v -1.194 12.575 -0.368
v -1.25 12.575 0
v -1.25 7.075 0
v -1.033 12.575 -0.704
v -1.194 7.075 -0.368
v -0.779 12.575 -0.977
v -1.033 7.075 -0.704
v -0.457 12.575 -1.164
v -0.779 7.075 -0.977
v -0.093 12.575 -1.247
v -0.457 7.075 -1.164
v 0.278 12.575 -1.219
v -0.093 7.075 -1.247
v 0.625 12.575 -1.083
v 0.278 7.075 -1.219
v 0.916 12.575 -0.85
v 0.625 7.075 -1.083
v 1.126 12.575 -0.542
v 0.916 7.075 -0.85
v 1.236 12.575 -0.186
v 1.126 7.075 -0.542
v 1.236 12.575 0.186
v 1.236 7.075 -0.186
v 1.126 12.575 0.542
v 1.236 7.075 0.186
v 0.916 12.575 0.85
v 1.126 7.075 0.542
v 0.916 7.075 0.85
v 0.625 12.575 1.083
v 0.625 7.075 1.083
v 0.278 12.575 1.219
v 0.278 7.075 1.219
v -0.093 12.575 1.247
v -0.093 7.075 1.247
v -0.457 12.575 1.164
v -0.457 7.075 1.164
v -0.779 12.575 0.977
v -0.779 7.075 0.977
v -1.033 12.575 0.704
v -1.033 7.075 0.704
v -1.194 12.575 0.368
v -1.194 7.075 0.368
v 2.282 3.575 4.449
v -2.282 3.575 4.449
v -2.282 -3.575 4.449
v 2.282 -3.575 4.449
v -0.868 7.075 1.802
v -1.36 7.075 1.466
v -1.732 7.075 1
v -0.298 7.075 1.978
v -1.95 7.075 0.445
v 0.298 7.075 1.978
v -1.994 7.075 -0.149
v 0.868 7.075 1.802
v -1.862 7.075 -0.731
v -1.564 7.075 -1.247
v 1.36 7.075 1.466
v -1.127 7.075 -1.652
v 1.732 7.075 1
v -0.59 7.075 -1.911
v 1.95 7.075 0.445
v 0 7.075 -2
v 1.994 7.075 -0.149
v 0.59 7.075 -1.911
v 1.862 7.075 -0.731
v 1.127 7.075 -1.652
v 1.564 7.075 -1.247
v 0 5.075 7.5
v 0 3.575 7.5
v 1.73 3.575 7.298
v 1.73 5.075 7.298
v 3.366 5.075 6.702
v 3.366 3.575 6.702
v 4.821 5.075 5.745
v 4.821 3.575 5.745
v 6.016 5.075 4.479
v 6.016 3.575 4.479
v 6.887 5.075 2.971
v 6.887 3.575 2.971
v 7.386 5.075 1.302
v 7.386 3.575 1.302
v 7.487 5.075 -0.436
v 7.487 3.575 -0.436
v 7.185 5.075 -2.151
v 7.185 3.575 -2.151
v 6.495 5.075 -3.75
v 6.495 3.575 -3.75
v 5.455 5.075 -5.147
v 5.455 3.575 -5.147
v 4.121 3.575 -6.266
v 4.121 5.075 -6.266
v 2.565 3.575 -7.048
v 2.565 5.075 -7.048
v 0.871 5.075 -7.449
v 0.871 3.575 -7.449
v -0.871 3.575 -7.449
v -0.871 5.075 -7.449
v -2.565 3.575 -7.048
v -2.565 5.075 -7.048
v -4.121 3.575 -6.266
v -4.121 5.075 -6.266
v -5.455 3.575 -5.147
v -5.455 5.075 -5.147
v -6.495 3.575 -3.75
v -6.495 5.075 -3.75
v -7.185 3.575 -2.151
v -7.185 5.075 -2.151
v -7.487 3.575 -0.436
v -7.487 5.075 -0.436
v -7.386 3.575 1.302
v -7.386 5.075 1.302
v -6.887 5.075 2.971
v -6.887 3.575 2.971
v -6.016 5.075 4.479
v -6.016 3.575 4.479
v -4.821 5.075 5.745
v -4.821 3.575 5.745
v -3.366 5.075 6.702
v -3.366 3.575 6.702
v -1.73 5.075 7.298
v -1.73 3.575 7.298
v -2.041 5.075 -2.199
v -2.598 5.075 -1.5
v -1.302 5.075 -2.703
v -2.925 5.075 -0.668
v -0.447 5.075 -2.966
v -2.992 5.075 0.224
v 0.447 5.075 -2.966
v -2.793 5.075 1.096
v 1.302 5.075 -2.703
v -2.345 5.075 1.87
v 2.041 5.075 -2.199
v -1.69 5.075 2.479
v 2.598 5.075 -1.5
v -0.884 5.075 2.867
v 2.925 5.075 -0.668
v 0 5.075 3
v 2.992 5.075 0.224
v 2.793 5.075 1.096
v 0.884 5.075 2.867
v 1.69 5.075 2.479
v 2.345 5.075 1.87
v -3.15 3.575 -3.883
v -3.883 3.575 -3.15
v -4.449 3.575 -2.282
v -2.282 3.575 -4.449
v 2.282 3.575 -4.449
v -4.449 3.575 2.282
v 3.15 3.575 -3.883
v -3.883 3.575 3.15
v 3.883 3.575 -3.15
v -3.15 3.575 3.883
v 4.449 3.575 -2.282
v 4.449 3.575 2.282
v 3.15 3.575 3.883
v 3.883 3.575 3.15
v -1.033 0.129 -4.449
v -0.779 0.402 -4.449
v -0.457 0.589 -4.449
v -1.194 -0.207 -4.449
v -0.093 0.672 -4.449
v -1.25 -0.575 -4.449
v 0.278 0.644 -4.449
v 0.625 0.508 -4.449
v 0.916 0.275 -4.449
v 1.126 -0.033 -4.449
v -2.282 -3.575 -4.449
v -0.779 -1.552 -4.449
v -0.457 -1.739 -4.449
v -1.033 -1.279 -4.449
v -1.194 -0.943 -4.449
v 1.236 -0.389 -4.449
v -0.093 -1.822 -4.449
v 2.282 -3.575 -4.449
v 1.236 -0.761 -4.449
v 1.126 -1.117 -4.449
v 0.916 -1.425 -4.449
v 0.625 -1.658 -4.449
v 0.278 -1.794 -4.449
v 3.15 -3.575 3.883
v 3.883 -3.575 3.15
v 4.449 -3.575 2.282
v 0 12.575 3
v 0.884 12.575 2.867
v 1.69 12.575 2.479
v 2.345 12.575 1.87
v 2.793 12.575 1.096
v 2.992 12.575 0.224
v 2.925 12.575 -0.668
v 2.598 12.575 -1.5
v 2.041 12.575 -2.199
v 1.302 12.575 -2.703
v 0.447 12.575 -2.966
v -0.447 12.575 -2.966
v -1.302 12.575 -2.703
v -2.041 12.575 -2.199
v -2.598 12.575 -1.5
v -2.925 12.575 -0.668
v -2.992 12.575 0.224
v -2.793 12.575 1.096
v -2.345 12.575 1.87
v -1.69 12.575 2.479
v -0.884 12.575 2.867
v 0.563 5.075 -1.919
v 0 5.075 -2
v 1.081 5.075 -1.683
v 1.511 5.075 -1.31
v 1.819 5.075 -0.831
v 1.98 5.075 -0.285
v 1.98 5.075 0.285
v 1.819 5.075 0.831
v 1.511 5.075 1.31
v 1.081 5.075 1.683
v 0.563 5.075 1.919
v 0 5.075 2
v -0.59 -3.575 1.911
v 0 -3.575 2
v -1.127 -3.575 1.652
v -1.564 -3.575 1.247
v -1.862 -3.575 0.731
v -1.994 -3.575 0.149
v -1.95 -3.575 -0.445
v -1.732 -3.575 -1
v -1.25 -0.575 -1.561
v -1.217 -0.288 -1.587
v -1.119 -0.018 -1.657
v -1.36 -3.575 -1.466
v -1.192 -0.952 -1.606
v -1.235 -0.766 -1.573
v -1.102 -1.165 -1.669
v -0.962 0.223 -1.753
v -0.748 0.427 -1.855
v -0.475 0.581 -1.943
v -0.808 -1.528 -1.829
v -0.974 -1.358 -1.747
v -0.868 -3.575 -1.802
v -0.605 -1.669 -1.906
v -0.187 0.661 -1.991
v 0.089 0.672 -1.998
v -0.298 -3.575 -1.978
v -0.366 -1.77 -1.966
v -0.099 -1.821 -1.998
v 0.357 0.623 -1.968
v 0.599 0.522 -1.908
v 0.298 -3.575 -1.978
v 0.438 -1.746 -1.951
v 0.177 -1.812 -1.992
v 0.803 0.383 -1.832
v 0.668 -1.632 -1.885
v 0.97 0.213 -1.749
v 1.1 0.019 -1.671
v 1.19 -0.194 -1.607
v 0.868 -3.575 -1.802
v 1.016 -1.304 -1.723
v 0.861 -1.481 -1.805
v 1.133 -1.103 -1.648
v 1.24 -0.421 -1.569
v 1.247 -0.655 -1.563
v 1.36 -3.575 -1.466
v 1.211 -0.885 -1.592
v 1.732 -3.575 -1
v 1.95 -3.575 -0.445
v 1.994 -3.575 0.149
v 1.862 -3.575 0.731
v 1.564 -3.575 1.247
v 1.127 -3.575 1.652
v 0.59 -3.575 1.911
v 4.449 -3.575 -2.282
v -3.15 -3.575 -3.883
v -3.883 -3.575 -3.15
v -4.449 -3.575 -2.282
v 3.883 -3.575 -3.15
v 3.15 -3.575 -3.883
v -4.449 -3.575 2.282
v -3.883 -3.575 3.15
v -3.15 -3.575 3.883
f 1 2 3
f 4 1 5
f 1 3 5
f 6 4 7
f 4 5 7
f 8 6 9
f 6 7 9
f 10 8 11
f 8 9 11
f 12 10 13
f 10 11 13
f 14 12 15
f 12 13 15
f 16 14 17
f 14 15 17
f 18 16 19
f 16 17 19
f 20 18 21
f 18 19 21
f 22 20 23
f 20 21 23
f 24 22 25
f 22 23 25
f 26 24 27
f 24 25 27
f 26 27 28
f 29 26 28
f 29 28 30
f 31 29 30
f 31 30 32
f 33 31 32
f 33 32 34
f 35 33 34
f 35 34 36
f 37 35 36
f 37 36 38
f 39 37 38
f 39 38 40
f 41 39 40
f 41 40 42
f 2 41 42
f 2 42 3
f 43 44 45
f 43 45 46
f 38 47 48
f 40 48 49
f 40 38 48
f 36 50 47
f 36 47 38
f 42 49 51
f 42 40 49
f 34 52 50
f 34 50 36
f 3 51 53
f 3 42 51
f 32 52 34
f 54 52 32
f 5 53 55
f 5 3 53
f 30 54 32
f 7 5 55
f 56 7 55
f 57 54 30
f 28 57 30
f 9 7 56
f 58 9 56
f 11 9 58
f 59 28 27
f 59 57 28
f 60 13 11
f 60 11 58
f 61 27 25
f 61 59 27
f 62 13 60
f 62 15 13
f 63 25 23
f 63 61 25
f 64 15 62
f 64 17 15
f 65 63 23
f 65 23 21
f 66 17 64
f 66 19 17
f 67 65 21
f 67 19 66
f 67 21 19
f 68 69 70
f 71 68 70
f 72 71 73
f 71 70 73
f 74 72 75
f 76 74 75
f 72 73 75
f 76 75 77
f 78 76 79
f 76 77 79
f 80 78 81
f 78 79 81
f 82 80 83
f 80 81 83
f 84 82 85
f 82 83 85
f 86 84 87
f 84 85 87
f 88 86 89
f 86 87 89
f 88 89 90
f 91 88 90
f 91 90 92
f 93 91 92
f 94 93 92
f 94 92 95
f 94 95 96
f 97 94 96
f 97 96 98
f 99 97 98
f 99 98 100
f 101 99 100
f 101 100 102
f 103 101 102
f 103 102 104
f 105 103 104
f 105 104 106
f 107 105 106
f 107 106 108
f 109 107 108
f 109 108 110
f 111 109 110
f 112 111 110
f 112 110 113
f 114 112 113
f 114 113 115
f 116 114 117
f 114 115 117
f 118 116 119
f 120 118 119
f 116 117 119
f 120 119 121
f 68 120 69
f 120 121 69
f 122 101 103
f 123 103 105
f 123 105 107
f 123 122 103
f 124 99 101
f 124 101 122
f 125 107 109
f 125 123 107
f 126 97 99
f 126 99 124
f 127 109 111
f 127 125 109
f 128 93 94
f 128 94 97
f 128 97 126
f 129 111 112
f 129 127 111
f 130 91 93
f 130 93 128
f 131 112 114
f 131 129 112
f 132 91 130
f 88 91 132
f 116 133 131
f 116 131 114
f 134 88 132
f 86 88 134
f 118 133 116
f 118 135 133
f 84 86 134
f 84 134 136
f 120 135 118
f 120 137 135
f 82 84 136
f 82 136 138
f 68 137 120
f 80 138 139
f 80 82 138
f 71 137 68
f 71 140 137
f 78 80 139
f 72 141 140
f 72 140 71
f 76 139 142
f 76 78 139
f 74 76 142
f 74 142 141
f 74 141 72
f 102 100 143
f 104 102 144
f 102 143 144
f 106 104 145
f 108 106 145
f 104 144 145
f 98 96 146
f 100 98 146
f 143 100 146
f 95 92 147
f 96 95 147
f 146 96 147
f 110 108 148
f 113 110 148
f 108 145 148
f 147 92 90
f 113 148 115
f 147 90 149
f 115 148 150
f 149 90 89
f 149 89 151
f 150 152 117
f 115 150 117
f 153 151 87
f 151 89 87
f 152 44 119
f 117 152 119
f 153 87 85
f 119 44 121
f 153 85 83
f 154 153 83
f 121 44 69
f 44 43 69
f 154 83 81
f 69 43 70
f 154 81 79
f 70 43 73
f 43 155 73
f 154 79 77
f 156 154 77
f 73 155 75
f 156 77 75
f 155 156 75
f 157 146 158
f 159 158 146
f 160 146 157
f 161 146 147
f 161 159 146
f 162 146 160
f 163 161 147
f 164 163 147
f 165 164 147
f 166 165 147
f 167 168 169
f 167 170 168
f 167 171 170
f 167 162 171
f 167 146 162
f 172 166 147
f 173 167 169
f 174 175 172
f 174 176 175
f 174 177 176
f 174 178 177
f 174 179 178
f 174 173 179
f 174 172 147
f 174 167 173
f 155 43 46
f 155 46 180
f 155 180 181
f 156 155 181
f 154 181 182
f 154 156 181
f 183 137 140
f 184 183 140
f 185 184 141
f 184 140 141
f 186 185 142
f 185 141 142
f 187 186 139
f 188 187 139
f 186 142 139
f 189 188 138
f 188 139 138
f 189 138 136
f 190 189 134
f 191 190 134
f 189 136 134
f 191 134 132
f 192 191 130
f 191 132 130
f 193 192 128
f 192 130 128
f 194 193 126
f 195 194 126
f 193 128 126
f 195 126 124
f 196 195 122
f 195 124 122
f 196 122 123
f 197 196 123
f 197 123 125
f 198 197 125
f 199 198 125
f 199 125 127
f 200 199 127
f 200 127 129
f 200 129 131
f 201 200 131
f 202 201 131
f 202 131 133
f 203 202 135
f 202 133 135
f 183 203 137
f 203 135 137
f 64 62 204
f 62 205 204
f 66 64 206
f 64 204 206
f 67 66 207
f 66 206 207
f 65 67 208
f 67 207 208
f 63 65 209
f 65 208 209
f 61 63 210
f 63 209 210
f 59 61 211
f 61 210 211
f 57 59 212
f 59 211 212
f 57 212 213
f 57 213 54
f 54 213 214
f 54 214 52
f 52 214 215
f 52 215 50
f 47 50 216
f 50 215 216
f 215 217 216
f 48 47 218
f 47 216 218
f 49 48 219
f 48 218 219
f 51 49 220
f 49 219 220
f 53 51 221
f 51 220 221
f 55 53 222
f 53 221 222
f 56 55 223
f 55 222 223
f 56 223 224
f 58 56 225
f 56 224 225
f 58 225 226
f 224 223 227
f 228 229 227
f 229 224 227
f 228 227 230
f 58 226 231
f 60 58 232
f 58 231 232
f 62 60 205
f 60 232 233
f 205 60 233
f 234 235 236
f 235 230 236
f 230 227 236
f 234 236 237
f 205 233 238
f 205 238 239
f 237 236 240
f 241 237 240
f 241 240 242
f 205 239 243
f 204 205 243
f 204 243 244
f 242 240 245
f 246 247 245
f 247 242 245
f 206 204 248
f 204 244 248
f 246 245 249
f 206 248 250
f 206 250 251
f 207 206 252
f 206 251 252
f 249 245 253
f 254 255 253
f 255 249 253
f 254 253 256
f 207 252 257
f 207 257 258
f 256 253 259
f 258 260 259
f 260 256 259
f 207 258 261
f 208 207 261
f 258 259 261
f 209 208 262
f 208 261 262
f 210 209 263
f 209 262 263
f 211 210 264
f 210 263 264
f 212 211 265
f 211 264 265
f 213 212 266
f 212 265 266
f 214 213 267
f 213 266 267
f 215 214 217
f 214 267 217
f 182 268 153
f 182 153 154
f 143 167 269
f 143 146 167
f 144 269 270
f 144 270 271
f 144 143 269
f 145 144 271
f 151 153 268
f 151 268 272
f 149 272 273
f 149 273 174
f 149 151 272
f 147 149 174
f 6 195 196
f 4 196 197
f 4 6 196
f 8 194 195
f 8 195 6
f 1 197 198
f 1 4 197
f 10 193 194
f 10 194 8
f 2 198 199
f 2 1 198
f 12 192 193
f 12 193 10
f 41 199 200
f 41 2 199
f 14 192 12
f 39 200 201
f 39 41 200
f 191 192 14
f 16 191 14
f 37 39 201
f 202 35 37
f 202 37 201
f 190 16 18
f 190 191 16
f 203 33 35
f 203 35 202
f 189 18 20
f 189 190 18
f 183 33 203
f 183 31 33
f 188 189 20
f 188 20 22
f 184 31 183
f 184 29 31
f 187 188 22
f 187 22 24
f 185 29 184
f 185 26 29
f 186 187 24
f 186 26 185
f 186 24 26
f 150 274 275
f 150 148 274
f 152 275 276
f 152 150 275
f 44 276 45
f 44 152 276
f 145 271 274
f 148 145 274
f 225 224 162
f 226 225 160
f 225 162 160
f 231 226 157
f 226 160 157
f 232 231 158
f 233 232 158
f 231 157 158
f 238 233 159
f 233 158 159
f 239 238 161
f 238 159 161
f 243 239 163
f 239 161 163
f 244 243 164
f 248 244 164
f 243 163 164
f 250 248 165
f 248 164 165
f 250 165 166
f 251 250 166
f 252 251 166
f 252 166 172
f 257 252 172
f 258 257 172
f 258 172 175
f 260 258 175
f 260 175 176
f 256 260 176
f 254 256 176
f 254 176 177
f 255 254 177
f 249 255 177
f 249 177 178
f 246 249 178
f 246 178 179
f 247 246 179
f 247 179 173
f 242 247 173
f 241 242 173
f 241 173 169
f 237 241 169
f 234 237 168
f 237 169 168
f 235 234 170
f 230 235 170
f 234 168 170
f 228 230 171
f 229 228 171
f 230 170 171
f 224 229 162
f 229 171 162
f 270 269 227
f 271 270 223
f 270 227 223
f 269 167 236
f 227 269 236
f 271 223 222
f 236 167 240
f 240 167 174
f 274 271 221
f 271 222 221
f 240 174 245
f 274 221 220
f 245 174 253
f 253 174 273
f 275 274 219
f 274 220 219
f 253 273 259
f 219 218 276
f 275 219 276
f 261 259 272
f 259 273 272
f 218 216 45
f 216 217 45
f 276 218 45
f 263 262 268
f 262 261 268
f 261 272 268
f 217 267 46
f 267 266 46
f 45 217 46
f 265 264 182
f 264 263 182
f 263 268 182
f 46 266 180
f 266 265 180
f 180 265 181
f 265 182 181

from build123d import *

# Parameters (mm, degrees)
SKETCH1_R                  = 5
SKETCH1_R_2                = 2
BOSS_EXTRUDE1_DEPTH        = 3.575
SKETCH2_R                  = 7.5
SKETCH2_R_2                = 2
BOSS_EXTRUDE2_DEPTH        = 1.5
SKETCH3_W                  = 11.269871592
SKETCH3_H                  = 12.441128044
SKETCH3_W_2                = 8.898049958
SKETCH3_H_2                = 8.898049958
CUT_EXTRUDE1_DEPTH         = 7.15
M3X0_5_TAPPED_HOLE1_REACH  = 16.993
M3X0_5_TAPPED_HOLE1_BORE_R = 1.25
SKETCH9_R                  = 3
SKETCH9_R_2                = 2
BOSS_EXTRUDE3_DEPTH        = 7.5
SKETCH11_R                 = 2
BOSS_EXTRUDE4_DEPTH        = 7.5
M3X0_5_TAPPED_HOLE2_D      = 2.5
SKETCH15_R                 = 2
SKETCH15_R_2               = 1.25
CUT_EXTRUDE2_DEPTH         = 2


with BuildPart() as part:
    # Sketch1 → Boss-Extrude1 (new, symmetric)
    with BuildSketch(Plane(origin=(0, 0, 0), x_dir=(1, 0, 0), z_dir=(0, 1, 0))):
        with Locations(Location((0, 0, 0), (0, 0, 270))):
            Circle(SKETCH1_R)
        with Locations(Location((0, 0, 0), (0, 0, 270))):
            Circle(SKETCH1_R_2, mode=Mode.SUBTRACT)
    extrude(amount=BOSS_EXTRUDE1_DEPTH, both=True)

    # Sketch2 → Boss-Extrude2 (add)
    with BuildSketch(Plane(origin=(0, 3.575, 0), x_dir=(1, 0, 0), z_dir=(0, 1, 0))):
        with Locations(Location((0, 0, 0), (0, 0, 270))):
            Circle(SKETCH2_R)
        with Locations(Location((0, 0, 0), (0, 0, 270))):
            Circle(SKETCH2_R_2, mode=Mode.SUBTRACT)
    extrude(amount=BOSS_EXTRUDE2_DEPTH)

    # Sketch3 → Cut-Extrude1 (cut)
    with BuildSketch(Plane.XZ.offset(3.575)):
        Rectangle(SKETCH3_W, SKETCH3_H)
        Rectangle(SKETCH3_W_2, SKETCH3_H_2, mode=Mode.SUBTRACT)
    extrude(amount=-CUT_EXTRUDE1_DEPTH, mode=Mode.SUBTRACT)

    # M3x0.5 Tapped Hole1 bore → M3x0.5 Tapped Hole1 (cut, up to next)
    with BuildSketch(Plane(origin=(0, 0, -4.449024979), x_dir=(-1, 0, 0), z_dir=(0, 0, -1)), mode=Mode.PRIVATE) as m3x0_5_tapped_hole1_sk1:
        with Locations((0, -0.575)):
            Circle(M3X0_5_TAPPED_HOLE1_BORE_R)
    m3x0_5_tapped_hole1_tool1 = extrude(m3x0_5_tapped_hole1_sk1.sketch, amount=-M3X0_5_TAPPED_HOLE1_REACH, mode=Mode.PRIVATE) & part.part
    add(m3x0_5_tapped_hole1_tool1.solids().sort_by_distance((0, -0.575, -4.449025))[0], mode=Mode.SUBTRACT)

    # Sketch9 → Boss-Extrude3 (add)
    with BuildSketch(Plane(origin=(0, 5.075, 0), x_dir=(1, 0, 0), z_dir=(0, 1, 0))):
        with Locations(Location((0, 0, 0), (0, 0, 270))):
            Circle(SKETCH9_R)
        with Locations(Location((0, 0, 0), (0, 0, 270))):
            Circle(SKETCH9_R_2, mode=Mode.SUBTRACT)
    extrude(amount=BOSS_EXTRUDE3_DEPTH)

    # Sketch11 → Boss-Extrude4 (add)
    with BuildSketch(Plane(origin=(0, 12.575, 0), x_dir=(1, 0, 0), z_dir=(0, 1, 0))):
        with Locations(Location((0, 0, 0), (0, 0, 270))):
            Circle(SKETCH11_R)
    extrude(amount=-BOSS_EXTRUDE4_DEPTH)

    # M3x0.5 Tapped Hole2 (through all)
    with Locations(Plane(origin=(0, 12.575, 0), x_dir=(1, 0, 0), z_dir=(0, 1, 0))):
        with Locations((0, 0)):
            Hole(M3X0_5_TAPPED_HOLE2_D / 2)

    # Sketch15 → Cut-Extrude2 (cut)
    with BuildSketch(Plane.XZ.offset(-5.075)):
        with Locations(Location((0, 0, 0), (0, 0, 270))):
            Circle(SKETCH15_R)
        with Locations(Location((0, 0, 0), (0, 0, 90))):
            Circle(SKETCH15_R_2, mode=Mode.SUBTRACT)
    extrude(amount=-CUT_EXTRUDE2_DEPTH, mode=Mode.SUBTRACT)


solid = part.part
